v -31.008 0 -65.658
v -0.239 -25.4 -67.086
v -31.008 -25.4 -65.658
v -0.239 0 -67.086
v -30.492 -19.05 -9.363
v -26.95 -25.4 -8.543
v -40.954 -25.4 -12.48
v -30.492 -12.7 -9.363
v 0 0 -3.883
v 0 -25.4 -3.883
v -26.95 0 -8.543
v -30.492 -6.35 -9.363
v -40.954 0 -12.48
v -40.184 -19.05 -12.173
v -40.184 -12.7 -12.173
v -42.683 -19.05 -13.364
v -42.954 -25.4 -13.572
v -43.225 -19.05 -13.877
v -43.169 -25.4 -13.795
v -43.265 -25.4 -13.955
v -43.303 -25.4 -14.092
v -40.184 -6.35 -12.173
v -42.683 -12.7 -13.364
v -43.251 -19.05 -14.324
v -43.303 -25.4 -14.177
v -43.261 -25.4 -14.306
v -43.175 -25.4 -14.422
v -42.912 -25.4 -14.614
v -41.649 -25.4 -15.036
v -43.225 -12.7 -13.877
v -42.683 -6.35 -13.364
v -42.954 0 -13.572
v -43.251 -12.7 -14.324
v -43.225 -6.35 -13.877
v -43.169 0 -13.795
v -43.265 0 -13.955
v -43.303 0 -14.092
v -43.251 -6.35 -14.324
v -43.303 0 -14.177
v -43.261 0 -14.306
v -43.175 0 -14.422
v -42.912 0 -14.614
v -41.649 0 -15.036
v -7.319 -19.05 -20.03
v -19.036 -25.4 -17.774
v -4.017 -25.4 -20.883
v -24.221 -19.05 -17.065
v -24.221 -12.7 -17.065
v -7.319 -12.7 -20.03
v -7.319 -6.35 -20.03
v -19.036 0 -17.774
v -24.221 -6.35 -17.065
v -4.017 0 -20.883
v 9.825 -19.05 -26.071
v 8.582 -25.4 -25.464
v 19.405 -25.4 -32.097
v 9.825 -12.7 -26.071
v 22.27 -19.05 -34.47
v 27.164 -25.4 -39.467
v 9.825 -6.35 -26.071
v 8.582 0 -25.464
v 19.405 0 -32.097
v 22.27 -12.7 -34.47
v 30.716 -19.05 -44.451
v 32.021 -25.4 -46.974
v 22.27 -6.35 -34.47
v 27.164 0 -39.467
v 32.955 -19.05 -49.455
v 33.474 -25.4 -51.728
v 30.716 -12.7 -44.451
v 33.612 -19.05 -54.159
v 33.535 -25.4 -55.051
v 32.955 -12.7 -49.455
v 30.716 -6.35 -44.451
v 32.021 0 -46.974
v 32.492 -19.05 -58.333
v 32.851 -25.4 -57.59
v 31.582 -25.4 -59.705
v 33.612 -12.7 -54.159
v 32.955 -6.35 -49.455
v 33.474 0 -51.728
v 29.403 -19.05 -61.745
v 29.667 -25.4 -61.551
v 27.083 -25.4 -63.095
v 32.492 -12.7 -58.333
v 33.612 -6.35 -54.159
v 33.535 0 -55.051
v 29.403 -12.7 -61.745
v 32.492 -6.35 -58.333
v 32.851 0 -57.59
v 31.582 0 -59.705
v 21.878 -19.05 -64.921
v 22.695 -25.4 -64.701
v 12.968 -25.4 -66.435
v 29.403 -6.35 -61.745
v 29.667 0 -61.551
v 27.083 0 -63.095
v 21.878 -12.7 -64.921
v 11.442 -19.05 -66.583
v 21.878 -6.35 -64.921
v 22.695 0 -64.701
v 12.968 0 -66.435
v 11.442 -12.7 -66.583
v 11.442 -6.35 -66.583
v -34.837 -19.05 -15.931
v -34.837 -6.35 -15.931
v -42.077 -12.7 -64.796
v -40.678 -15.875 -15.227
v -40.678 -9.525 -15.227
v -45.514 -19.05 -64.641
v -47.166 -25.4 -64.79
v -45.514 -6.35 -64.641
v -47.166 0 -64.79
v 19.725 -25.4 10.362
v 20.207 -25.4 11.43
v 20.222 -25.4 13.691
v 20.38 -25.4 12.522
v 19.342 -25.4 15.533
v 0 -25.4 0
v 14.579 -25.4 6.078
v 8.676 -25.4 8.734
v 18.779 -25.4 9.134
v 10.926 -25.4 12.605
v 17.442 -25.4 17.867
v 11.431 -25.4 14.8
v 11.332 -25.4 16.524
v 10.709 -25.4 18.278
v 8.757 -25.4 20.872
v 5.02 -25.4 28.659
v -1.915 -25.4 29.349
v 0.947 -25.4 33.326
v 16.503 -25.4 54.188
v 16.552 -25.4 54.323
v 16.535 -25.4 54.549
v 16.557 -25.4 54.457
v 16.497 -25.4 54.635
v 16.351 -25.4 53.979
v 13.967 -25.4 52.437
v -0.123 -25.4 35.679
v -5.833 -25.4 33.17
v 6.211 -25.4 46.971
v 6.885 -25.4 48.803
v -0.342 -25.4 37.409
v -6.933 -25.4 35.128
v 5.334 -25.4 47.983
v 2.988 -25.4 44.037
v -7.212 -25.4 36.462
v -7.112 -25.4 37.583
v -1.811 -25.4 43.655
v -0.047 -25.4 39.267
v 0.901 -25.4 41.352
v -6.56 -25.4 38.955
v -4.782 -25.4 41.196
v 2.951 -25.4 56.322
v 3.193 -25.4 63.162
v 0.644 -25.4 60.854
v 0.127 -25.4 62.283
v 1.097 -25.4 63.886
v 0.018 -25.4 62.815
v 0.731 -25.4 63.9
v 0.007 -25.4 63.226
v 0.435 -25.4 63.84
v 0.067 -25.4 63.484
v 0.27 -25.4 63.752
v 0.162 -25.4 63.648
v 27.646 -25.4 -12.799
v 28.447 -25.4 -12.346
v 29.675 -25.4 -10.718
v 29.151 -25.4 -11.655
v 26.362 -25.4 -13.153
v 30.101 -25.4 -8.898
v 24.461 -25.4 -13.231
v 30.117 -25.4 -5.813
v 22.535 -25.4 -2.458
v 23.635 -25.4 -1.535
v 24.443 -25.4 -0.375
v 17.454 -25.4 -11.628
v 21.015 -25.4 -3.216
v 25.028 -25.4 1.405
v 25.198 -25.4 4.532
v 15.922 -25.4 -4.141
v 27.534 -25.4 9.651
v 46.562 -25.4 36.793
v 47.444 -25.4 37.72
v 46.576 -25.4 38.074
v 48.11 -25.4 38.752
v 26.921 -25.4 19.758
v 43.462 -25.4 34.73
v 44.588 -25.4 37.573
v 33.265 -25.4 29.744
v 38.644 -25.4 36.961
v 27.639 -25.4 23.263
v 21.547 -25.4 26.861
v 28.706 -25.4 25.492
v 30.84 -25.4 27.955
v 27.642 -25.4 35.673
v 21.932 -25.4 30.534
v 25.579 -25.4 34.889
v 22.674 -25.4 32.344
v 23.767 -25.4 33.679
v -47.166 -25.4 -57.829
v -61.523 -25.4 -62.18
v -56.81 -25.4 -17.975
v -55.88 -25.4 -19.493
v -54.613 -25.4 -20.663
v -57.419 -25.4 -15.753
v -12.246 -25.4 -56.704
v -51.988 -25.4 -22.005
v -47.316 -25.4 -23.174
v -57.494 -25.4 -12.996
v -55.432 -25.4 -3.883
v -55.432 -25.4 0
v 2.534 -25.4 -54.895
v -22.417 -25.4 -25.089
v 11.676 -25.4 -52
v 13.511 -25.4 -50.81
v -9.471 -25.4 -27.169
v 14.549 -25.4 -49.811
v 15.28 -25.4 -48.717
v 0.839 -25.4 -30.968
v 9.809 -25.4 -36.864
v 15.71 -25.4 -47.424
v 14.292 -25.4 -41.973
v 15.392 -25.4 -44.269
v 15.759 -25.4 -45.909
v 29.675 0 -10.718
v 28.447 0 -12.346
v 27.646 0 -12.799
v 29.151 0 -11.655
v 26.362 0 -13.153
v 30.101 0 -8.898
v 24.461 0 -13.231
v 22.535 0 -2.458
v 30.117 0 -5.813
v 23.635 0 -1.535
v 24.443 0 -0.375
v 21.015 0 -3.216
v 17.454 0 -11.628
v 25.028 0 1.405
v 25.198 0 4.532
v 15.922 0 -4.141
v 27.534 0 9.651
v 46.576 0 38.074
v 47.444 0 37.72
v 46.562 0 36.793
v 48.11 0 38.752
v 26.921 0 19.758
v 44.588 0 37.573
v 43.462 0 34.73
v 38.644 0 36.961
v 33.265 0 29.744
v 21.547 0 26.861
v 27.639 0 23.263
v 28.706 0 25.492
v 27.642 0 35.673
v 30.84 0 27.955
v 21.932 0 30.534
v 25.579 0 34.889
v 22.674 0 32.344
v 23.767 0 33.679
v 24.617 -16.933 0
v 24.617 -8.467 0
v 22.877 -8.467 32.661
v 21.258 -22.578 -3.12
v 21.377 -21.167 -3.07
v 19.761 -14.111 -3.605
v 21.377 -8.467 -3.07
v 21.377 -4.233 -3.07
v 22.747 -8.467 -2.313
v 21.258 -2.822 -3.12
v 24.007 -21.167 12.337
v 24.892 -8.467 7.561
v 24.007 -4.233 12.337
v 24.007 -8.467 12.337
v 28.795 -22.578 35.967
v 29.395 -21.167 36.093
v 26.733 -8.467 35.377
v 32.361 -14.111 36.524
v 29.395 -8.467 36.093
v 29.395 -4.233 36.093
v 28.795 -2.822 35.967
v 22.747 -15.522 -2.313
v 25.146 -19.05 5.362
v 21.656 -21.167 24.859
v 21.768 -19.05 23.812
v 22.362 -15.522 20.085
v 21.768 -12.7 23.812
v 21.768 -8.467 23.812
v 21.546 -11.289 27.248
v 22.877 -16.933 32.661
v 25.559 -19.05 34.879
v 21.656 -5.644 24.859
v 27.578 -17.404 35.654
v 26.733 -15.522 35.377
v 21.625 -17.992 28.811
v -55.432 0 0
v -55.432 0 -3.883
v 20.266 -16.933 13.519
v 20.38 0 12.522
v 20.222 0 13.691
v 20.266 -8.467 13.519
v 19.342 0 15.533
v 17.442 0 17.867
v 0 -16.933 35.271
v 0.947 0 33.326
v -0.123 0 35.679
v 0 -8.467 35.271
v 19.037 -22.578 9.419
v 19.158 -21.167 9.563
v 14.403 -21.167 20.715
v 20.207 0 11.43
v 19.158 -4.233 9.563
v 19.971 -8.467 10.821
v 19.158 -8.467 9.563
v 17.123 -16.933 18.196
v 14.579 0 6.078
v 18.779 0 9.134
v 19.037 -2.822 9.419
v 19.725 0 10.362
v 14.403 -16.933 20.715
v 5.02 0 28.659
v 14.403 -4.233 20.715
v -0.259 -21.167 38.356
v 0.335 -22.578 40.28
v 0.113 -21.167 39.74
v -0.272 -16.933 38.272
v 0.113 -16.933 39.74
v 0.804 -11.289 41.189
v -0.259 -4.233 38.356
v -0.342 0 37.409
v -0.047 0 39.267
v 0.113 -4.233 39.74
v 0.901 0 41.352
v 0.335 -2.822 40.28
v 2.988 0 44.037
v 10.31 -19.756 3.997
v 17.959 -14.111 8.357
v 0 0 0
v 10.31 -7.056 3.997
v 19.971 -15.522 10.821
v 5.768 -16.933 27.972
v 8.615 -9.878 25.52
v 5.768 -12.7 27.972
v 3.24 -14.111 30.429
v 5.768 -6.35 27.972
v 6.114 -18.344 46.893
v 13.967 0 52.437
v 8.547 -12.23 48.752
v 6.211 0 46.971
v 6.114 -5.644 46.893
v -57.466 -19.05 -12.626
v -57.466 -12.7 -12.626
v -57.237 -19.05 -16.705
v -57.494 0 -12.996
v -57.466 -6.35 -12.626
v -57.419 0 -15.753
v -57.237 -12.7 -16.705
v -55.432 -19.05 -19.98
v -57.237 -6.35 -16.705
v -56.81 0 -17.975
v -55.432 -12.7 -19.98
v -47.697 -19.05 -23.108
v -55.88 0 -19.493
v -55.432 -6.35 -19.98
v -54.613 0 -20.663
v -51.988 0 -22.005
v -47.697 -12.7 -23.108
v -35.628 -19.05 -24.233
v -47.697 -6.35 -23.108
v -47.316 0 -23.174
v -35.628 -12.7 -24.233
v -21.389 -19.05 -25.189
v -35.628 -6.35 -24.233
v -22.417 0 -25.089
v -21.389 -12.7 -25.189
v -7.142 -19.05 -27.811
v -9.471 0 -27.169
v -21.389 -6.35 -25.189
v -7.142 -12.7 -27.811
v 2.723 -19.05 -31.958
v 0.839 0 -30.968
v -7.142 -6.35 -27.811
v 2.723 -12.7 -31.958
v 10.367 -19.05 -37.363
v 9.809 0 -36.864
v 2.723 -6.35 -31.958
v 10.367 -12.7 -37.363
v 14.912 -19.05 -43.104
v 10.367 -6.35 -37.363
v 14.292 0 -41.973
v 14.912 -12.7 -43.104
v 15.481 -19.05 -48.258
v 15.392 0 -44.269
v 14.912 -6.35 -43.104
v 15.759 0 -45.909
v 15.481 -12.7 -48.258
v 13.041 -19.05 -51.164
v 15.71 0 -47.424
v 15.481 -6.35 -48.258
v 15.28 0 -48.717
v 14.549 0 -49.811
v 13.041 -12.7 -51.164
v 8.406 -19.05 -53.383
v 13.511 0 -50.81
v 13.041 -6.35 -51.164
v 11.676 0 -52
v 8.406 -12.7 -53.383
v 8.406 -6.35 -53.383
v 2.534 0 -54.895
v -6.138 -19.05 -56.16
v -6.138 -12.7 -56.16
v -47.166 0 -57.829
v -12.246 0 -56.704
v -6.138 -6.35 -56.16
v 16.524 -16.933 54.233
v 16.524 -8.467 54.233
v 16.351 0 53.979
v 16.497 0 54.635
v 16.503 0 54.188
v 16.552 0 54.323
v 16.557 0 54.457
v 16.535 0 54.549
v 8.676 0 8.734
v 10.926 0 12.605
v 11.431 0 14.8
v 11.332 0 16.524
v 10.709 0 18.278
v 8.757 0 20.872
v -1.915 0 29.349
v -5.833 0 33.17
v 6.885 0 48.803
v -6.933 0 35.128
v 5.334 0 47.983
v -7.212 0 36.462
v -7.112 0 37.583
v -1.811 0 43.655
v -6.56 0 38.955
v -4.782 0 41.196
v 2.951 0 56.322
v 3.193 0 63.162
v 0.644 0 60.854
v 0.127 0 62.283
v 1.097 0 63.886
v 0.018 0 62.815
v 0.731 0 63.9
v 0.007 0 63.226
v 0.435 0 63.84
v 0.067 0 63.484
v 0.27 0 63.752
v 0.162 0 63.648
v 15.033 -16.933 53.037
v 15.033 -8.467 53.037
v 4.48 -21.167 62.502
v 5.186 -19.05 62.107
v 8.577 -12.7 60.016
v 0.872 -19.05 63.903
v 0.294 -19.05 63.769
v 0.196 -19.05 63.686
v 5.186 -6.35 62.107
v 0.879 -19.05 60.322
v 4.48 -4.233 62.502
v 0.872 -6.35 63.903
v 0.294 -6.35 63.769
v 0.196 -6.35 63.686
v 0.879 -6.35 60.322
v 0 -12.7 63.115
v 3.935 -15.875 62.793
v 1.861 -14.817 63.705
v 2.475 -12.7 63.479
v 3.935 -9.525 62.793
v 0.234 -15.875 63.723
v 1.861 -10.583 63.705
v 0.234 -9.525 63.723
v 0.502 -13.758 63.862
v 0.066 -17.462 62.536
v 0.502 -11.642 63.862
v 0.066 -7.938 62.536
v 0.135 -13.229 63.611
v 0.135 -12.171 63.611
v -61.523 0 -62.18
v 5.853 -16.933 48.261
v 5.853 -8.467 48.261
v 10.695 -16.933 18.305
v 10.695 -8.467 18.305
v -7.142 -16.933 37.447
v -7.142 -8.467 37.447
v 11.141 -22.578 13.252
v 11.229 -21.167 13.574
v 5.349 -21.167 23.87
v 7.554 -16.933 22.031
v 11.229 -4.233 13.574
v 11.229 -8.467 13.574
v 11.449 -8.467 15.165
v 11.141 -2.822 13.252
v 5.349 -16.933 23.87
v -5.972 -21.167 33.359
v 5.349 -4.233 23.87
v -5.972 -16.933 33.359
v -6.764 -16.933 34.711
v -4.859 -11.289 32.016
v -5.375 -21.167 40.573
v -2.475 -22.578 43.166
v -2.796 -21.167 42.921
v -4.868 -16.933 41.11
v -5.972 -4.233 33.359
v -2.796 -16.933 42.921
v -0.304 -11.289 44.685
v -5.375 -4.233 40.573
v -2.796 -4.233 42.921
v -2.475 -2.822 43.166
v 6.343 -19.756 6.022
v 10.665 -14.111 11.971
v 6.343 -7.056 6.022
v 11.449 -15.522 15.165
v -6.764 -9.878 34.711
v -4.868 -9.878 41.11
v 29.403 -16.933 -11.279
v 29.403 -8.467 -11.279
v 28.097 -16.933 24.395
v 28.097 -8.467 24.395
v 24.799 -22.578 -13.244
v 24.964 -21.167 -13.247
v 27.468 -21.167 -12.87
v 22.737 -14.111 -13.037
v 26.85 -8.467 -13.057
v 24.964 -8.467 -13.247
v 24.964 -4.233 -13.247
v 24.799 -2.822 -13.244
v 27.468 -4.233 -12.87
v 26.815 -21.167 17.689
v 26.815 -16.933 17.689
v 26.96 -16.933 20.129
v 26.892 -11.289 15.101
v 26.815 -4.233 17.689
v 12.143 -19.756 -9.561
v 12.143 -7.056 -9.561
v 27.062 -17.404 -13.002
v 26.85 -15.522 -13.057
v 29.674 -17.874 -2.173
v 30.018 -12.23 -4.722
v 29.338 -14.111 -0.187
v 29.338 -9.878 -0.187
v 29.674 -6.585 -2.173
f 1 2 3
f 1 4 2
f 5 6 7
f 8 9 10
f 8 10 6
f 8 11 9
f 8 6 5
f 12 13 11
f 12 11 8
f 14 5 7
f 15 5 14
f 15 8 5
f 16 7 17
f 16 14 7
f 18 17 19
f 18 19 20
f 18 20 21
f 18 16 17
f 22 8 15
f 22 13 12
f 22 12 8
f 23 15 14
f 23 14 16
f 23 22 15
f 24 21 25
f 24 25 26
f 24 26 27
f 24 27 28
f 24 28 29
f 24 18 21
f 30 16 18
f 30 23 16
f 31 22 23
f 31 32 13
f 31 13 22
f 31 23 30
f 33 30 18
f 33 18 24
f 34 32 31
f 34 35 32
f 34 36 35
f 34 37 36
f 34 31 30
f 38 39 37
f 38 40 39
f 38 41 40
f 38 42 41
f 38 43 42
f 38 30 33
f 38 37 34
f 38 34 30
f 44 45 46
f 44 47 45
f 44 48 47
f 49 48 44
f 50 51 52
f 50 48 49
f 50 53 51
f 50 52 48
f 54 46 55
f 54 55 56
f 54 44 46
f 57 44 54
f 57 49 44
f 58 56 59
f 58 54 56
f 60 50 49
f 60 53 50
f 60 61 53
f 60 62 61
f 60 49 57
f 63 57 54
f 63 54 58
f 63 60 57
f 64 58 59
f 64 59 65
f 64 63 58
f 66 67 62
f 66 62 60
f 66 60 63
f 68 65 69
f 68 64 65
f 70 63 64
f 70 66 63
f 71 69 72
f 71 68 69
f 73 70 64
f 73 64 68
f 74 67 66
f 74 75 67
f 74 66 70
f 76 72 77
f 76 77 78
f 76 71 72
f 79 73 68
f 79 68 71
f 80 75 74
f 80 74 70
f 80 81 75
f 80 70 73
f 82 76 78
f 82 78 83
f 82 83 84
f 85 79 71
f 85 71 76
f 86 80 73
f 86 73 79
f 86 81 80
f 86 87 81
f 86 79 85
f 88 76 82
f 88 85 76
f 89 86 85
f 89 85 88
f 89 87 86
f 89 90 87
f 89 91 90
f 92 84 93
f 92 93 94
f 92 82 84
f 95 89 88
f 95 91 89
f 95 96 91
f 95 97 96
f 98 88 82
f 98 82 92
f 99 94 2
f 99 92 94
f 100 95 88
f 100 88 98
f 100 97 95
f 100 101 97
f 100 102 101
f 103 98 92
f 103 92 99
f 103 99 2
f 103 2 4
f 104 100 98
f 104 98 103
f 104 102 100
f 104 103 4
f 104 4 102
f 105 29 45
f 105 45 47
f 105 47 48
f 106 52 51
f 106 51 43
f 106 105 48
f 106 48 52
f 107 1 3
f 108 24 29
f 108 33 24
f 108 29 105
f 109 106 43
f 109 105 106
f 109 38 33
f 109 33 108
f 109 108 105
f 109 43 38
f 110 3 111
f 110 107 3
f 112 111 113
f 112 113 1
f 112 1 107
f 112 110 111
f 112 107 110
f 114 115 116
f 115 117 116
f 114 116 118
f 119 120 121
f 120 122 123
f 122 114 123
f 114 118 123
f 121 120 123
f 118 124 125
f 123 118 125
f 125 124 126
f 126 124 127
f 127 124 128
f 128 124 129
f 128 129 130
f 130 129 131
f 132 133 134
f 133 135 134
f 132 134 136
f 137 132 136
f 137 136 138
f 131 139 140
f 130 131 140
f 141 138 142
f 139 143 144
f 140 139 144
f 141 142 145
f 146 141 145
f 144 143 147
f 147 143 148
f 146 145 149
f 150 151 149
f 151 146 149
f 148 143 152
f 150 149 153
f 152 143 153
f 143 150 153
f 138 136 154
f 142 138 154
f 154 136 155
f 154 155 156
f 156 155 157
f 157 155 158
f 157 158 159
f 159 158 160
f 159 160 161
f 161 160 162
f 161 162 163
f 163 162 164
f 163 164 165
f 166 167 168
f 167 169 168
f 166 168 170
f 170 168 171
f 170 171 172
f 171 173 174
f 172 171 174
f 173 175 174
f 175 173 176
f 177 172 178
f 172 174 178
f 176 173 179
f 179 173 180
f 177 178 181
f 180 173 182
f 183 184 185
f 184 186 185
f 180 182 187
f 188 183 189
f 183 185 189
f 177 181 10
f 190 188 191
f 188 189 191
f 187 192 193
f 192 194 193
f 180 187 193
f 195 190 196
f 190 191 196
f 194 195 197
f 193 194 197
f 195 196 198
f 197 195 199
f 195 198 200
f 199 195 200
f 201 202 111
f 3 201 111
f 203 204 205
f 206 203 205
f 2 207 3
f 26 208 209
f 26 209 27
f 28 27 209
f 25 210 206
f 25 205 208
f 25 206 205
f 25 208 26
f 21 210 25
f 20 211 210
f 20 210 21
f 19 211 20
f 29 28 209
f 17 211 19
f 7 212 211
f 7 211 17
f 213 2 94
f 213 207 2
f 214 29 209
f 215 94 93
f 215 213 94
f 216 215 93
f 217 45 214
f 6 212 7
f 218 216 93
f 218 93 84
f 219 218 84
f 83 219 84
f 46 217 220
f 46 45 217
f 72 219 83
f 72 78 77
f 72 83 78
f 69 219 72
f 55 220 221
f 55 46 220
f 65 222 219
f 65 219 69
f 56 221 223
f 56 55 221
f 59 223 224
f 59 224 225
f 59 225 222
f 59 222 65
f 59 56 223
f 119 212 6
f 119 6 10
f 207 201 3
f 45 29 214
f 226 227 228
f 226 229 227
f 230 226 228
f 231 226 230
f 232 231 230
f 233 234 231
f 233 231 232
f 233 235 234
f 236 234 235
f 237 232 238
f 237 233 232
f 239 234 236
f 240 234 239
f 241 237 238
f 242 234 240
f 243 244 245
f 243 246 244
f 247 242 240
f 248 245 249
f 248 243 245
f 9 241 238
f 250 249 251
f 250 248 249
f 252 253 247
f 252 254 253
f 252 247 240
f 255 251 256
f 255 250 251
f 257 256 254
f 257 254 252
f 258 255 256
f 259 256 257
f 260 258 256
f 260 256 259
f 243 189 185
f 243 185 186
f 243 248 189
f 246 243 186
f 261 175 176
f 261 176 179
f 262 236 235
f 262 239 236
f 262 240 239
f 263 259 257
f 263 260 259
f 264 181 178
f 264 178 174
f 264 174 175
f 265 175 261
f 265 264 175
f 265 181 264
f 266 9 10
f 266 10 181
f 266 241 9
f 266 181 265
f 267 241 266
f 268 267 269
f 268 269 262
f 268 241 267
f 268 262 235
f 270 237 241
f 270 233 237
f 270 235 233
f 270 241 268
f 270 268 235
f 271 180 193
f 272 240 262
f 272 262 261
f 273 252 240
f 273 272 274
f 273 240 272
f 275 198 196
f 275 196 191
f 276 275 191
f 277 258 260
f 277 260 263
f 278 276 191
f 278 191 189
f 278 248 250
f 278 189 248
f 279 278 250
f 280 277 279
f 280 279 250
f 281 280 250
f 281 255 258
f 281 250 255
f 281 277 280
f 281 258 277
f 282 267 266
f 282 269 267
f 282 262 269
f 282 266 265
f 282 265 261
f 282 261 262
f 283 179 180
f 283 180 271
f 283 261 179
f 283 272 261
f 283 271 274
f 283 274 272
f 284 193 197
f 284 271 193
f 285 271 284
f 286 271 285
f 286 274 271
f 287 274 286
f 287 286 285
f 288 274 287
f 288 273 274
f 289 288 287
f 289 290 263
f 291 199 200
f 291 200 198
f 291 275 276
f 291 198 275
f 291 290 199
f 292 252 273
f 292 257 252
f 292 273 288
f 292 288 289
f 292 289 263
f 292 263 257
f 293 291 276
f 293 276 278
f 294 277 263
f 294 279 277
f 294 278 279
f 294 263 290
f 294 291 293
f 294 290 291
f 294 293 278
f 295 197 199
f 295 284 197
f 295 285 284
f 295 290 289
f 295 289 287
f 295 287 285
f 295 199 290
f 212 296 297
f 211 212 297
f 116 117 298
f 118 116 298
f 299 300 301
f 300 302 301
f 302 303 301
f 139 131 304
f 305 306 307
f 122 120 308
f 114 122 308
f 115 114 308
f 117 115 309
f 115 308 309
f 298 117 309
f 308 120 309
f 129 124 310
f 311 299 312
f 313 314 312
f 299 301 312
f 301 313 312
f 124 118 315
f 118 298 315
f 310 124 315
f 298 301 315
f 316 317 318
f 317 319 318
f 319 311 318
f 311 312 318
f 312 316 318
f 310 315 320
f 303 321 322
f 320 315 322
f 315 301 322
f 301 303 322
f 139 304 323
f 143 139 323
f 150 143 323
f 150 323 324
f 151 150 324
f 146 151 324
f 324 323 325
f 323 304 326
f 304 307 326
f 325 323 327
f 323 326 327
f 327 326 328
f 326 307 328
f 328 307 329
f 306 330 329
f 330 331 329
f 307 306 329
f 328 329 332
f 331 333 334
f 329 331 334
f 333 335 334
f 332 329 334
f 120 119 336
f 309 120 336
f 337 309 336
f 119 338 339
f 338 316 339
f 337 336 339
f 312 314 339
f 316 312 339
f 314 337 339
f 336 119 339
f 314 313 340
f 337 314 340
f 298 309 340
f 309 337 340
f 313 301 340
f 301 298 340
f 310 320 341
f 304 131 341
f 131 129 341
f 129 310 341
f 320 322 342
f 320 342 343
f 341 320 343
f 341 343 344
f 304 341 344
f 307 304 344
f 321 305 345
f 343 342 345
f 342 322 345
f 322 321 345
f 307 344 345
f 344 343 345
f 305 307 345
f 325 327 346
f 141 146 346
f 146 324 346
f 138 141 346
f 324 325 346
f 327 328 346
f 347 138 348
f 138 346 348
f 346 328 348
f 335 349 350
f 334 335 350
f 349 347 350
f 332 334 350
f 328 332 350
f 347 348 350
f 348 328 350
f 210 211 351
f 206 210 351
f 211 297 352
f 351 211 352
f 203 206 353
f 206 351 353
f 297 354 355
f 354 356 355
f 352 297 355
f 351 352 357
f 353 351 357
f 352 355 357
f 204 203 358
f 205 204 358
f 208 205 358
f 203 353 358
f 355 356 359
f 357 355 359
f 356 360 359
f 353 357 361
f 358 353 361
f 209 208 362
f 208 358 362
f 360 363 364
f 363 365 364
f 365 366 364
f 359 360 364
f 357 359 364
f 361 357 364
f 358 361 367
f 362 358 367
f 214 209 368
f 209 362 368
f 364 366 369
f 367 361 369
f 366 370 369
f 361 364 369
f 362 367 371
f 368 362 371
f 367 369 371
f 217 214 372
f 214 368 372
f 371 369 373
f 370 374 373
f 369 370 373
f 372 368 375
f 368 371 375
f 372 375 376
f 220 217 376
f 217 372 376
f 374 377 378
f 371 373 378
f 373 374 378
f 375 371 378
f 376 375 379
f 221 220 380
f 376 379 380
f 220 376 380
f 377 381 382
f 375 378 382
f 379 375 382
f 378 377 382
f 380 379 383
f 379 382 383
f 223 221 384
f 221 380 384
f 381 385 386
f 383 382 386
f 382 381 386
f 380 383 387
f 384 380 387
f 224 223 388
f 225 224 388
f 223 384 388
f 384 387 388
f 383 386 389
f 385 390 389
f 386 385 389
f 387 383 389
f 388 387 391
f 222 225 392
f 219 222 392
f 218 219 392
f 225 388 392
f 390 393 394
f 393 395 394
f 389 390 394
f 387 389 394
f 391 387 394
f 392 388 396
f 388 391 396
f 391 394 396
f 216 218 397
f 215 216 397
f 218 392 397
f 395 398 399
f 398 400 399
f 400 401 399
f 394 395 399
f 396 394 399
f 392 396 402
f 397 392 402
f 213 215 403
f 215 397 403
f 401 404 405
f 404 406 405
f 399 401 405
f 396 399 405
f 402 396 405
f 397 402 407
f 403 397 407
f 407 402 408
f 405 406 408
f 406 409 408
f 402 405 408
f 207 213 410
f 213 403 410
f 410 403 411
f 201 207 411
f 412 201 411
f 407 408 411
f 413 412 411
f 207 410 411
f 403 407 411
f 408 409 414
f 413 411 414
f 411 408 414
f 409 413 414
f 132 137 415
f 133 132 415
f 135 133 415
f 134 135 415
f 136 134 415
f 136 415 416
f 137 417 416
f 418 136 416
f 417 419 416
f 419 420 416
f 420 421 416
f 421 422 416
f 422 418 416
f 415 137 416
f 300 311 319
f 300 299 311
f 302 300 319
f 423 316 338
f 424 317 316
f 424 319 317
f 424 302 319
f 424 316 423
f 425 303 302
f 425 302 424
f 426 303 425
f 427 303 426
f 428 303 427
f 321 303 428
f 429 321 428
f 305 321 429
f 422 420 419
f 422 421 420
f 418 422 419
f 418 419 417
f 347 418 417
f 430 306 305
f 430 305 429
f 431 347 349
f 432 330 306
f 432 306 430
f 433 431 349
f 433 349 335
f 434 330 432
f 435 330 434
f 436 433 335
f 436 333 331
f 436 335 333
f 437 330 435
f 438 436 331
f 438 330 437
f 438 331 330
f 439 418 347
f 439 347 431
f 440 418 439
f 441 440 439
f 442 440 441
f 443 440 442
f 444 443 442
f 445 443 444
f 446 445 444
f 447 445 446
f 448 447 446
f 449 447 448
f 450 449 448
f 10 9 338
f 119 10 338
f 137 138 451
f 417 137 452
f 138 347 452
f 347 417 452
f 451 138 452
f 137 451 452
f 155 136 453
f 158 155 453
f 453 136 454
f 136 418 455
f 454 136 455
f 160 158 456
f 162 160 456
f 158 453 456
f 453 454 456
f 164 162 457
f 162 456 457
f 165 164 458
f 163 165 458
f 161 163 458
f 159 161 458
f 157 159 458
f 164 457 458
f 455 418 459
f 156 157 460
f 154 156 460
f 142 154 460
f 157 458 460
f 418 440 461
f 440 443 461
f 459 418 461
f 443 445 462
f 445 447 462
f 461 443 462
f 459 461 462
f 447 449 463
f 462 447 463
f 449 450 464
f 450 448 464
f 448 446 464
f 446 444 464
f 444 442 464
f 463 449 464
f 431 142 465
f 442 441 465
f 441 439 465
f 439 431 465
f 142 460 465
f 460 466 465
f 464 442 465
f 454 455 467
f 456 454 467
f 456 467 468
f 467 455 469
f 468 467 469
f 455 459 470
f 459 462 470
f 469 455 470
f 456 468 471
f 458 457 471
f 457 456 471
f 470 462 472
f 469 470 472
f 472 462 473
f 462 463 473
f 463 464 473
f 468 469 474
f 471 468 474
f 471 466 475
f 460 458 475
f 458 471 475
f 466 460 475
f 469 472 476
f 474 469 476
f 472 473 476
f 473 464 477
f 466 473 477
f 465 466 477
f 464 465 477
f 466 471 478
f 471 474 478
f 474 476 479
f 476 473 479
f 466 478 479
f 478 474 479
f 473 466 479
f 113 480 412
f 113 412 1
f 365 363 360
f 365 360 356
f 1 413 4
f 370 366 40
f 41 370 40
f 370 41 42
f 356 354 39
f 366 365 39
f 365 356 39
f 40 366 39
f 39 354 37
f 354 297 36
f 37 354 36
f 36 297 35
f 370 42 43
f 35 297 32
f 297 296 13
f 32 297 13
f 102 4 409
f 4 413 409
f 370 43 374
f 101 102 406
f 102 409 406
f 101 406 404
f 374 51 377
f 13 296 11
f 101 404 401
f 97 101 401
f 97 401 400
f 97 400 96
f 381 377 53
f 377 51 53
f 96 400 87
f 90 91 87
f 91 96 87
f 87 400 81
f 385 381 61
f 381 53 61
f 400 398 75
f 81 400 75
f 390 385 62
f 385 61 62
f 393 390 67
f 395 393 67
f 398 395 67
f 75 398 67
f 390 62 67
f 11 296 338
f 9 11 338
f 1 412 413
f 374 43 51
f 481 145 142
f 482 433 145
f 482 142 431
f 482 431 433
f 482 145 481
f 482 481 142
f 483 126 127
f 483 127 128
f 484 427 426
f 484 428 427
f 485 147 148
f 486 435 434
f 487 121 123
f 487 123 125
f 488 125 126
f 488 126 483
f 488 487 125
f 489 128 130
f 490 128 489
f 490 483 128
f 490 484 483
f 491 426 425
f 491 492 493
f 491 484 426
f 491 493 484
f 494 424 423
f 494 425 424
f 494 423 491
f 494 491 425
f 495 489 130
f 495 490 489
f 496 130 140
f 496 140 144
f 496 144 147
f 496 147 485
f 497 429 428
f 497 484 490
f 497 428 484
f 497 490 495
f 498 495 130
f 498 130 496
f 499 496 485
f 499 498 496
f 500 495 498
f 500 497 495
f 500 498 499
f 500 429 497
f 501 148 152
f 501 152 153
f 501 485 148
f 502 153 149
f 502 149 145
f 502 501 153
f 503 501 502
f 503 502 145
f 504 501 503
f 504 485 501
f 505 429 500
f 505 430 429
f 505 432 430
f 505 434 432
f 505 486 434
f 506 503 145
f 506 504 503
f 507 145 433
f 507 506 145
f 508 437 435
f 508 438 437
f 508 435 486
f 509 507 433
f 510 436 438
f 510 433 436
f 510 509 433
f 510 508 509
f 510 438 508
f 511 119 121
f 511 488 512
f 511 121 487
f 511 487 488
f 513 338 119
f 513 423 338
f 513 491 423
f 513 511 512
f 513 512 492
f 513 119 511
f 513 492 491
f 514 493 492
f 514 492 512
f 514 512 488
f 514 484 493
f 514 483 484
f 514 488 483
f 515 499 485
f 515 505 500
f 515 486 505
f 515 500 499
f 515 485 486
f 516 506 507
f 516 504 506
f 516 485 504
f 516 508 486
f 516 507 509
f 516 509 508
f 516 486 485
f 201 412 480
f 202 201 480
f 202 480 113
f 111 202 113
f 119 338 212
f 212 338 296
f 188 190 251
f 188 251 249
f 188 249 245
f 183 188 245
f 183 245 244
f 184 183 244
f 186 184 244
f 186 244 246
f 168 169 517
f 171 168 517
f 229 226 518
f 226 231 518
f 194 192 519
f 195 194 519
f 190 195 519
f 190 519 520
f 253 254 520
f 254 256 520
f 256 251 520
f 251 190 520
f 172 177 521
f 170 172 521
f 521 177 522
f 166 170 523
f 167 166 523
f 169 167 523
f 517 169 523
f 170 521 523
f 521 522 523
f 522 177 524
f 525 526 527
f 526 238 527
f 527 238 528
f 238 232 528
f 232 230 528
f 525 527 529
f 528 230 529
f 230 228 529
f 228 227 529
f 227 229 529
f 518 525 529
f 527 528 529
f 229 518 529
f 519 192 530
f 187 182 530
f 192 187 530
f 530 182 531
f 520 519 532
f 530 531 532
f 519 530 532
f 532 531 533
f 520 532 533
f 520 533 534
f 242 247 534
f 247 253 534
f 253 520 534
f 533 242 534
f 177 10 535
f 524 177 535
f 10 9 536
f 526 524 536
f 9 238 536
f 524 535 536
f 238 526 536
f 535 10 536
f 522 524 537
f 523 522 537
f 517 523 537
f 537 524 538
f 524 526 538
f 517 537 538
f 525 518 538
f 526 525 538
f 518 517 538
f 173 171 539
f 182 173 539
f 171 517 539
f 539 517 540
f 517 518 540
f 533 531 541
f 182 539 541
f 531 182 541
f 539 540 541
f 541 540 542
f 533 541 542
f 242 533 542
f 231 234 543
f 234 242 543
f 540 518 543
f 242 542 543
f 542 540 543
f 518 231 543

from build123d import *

# Parameters (mm, degrees)
F1_DEPTH = 25.4


with BuildPart() as f1:
    # F0 (on Front) → F1 (new body)
    with BuildSketch(Plane.XZ):
        Polygon((0, -3.8830188569), (0, 0), (-32.8095592558, 0), (-55.4321408272, 0), (-55.4321408272, -3.8830188569), align=None)
        with BuildLine():
            add(Edge.make_bspline(
                [(0, -3.8830188569), (-22.3396686658, -6.7664181524), (-69.1084861348, -18.0619450276), (14.4702420451, -14.0383646496), (56.9721506391, -79.2245772506), (-44.3638130855, -63.3925810669), (-47.1661984921, -64.7899731994)],
                knots=[0, 0, 0, 0, 0.2235680847, 0.4706858224, 0.6844928274, 0.9778929424, 0.9778929424, 0.9778929424, 0.9778929424], degree=3))
            Line((0, -3.8830188569), (-55.4321408272, -3.8830188569))
            add(Edge.make_bspline(
                [(-55.4321408272, -3.8830188569), (-57.1473305919, -9.3609467626), (-62.6130160741, -28.5448533445), (-6.4024398502, -19.3013166153), (33.1327371883, -56.7449307054), (-17.9986081788, -57.3881984987), (-47.1661984921, -57.8291714191)],
                knots=[0, 0, 0, 0, 0.1638297062, 0.4494384528, 0.6749290673, 1, 1, 1, 1], degree=3))
            add(Edge.make_bspline(
                [(-47.1661984921, -57.8291714191), (-47.1661984921, -60.1494386792), (-47.1661984921, -62.4697059393), (-47.1661984921, -64.7899731994)],
                knots=[0, 0, 0, 0, 6.9608017802, 6.9608017802, 6.9608017802, 6.9608017802], degree=3))
        make_face()
        with BuildLine():
            Line((-61.522834003, -62.1796660125), (-47.1661984921, -64.7899731994))
            add(Edge.make_bspline(
                [(-47.1661984921, -57.8291714191), (-47.1661984921, -60.1494386792), (-47.1661984921, -62.4697059393), (-47.1661984921, -64.7899731994)],
                knots=[0, 0, 0, 0, 6.9608017802, 6.9608017802, 6.9608017802, 6.9608017802], degree=3))
            Line((-47.1661984921, -57.8291714191), (-61.522834003, -62.1796660125))
        make_face()
    extrude(amount=F1_DEPTH)


with BuildPart() as f1b:
    # F0 (on Front) → F1, piece 2 (new body)
    with BuildSketch(Plane.XZ):
        with BuildLine():
            add(Edge.make_bspline(
                [(0, -3.8830188569), (9.9289465404, -3.6338687787), (35.8347748597, -9.1910474421), (9.7993757977, 42.4850067761), (42.4191825597, 35.4199321557), (48.1096766889, 38.751848042)],
                knots=[0, 0, 0, 0, 0.3158370182, 0.677663788, 1, 1, 1, 1], degree=3))
            add(Edge.make_bspline(
                [(0, -3.8830188569), (12.3079884685, -9.8806879625), (41.3757800869, -24.0609993996), (15.8388542517, 31.6190019918), (45.2003145758, 32.9629019724), (48.1096766889, 38.751848042)],
                knots=[0, 0, 0, 0, 0.334850925, 0.698196314, 1, 1, 1, 1], degree=3))
        make_face()
    extrude(amount=F1_DEPTH)


with BuildPart() as f1c:
    # F0 (on Front) → F1, piece 3 (new body)
    with BuildSketch(Plane.XZ):
        with BuildLine():
            add(Edge.make_bspline(
                [(0, 0), (6.8867195335, 6.2206273049), (21.4241070417, 19.351940296), (-17.1808047998, 34.2671980223), (-0.4350416223, 44.886293105), (5.3342361736, 47.9833388277)],
                knots=[0, 0, 0, 0, 0.2875572081, 0.6070133312, 0.7846319848, 0.7846319848, 0.7846319848, 0.7846319848], degree=3))
            add(Edge.make_bspline(
                [(0, 0), (10.8050769677, 3.9557167918), (33.5465950735, 12.2813405065), (-11.1611995644, 34.7868953378), (5.5361510143, 46.950767387), (13.9666379964, 52.4372129067)],
                knots=[0, 0, 0, 0, 0.3210692379, 0.6757565827, 0.9722206742, 0.9722206742, 0.9722206742, 0.9722206742], degree=3))
            add(Edge.make_bspline(
                [(6.8849208153, 48.8031134544), (9.6084625056, 50.2230197913), (12.1695910081, 51.4654057539), (13.9666379964, 52.4372129067)],
                knots=[0.8006403858, 0.8006403858, 0.8006403858, 0.8006403858, 0.8857159052, 0.8857159052, 0.8857159052, 0.8857159052], degree=3))
            add(Edge.make_bspline(
                [(6.8849208153, 48.8031134544), (7.0058713252, 48.451220393), (7.2493558454, 47.2965846459), (6.160167473, 47.6871631986), (5.3342361736, 47.9833388277)],
                knots=[0.8222427967, 0.8222427967, 0.8222427967, 0.8222427967, 0.8652067524, 1, 1, 1, 1], degree=3))
        make_face()
        with BuildLine():
            add(Edge.make_bspline(
                [(5.3342361736, 47.9833388277), (5.8542092197, 48.2624691375), (6.3724402832, 48.5359340102), (6.8849208153, 48.8031134544)],
                knots=[0.7846319848, 0.7846319848, 0.7846319848, 0.7846319848, 0.8006403858, 0.8006403858, 0.8006403858, 0.8006403858], degree=3))
            add(Edge.make_bspline(
                [(6.8849208153, 48.8031134544), (7.0058713252, 48.451220393), (7.2493558454, 47.2965846459), (6.160167473, 47.6871631986), (5.3342361736, 47.9833388277)],
                knots=[0.8222427967, 0.8222427967, 0.8222427967, 0.8222427967, 0.8652067524, 1, 1, 1, 1], degree=3))
        make_face()
        with BuildLine():
            add(Edge.make_bspline(
                [(13.9666379964, 52.4372129067), (14.7565928395, 52.9513047046), (15.5538203714, 53.464942843), (16.3510479033, 53.9785809815)],
                knots=[0.9722206742, 0.9722206742, 0.9722206742, 0.9722206742, 1, 1, 1, 1], degree=3))
            add(Edge.make_bspline(
                [(13.9666379964, 52.4372129067), (15.1501204646, 53.0772166101), (16.0022090524, 53.5998661307), (16.3510479033, 53.9785809815)],
                knots=[0.8857159052, 0.8857159052, 0.8857159052, 0.8857159052, 0.9417441484, 0.9417441484, 0.9417441484, 0.9417441484], degree=3))
        make_face()
        with BuildLine():
            add(Edge.make_bspline(
                [(6.8849208153, 48.8031134544), (9.6084625056, 50.2230197913), (12.1695910081, 51.4654057539), (13.9666379964, 52.4372129067)],
                knots=[0.8006403858, 0.8006403858, 0.8006403858, 0.8006403858, 0.8857159052, 0.8857159052, 0.8857159052, 0.8857159052], degree=3))
            add(Edge.make_bspline(
                [(13.9666379964, 52.4372129067), (14.7565928395, 52.9513047046), (15.5538203714, 53.464942843), (16.3510479033, 53.9785809815)],
                knots=[0.9722206742, 0.9722206742, 0.9722206742, 0.9722206742, 1, 1, 1, 1], degree=3))
            add(Edge.make_bspline(
                [(16.3510479033, 53.9785809815), (16.6073316231, 54.2568138975), (16.5919864898, 54.4573581304), (16.4969410267, 54.6351072384)],
                knots=[0.9417441484, 0.9417441484, 0.9417441484, 0.9417441484, 0.9829067843, 0.9829067843, 0.9829067843, 0.9829067843], degree=3))
            add(Edge.make_bspline(
                [(16.4969410267, 54.6351072384), (8.2717965897, 60.3386520901), (-6.9397755805, 70.8789368702), (5.8208400435, 51.8989469536), (6.8849208153, 48.8031134544)],
                knots=[0.0006375287, 0.0006375287, 0.0006375287, 0.0006375287, 0.4442607669, 0.8222427967, 0.8222427967, 0.8222427967, 0.8222427967], degree=3))
        make_face()
    extrude(amount=F1_DEPTH)


solid = Compound([f1.part, f1b.part, f1c.part])
